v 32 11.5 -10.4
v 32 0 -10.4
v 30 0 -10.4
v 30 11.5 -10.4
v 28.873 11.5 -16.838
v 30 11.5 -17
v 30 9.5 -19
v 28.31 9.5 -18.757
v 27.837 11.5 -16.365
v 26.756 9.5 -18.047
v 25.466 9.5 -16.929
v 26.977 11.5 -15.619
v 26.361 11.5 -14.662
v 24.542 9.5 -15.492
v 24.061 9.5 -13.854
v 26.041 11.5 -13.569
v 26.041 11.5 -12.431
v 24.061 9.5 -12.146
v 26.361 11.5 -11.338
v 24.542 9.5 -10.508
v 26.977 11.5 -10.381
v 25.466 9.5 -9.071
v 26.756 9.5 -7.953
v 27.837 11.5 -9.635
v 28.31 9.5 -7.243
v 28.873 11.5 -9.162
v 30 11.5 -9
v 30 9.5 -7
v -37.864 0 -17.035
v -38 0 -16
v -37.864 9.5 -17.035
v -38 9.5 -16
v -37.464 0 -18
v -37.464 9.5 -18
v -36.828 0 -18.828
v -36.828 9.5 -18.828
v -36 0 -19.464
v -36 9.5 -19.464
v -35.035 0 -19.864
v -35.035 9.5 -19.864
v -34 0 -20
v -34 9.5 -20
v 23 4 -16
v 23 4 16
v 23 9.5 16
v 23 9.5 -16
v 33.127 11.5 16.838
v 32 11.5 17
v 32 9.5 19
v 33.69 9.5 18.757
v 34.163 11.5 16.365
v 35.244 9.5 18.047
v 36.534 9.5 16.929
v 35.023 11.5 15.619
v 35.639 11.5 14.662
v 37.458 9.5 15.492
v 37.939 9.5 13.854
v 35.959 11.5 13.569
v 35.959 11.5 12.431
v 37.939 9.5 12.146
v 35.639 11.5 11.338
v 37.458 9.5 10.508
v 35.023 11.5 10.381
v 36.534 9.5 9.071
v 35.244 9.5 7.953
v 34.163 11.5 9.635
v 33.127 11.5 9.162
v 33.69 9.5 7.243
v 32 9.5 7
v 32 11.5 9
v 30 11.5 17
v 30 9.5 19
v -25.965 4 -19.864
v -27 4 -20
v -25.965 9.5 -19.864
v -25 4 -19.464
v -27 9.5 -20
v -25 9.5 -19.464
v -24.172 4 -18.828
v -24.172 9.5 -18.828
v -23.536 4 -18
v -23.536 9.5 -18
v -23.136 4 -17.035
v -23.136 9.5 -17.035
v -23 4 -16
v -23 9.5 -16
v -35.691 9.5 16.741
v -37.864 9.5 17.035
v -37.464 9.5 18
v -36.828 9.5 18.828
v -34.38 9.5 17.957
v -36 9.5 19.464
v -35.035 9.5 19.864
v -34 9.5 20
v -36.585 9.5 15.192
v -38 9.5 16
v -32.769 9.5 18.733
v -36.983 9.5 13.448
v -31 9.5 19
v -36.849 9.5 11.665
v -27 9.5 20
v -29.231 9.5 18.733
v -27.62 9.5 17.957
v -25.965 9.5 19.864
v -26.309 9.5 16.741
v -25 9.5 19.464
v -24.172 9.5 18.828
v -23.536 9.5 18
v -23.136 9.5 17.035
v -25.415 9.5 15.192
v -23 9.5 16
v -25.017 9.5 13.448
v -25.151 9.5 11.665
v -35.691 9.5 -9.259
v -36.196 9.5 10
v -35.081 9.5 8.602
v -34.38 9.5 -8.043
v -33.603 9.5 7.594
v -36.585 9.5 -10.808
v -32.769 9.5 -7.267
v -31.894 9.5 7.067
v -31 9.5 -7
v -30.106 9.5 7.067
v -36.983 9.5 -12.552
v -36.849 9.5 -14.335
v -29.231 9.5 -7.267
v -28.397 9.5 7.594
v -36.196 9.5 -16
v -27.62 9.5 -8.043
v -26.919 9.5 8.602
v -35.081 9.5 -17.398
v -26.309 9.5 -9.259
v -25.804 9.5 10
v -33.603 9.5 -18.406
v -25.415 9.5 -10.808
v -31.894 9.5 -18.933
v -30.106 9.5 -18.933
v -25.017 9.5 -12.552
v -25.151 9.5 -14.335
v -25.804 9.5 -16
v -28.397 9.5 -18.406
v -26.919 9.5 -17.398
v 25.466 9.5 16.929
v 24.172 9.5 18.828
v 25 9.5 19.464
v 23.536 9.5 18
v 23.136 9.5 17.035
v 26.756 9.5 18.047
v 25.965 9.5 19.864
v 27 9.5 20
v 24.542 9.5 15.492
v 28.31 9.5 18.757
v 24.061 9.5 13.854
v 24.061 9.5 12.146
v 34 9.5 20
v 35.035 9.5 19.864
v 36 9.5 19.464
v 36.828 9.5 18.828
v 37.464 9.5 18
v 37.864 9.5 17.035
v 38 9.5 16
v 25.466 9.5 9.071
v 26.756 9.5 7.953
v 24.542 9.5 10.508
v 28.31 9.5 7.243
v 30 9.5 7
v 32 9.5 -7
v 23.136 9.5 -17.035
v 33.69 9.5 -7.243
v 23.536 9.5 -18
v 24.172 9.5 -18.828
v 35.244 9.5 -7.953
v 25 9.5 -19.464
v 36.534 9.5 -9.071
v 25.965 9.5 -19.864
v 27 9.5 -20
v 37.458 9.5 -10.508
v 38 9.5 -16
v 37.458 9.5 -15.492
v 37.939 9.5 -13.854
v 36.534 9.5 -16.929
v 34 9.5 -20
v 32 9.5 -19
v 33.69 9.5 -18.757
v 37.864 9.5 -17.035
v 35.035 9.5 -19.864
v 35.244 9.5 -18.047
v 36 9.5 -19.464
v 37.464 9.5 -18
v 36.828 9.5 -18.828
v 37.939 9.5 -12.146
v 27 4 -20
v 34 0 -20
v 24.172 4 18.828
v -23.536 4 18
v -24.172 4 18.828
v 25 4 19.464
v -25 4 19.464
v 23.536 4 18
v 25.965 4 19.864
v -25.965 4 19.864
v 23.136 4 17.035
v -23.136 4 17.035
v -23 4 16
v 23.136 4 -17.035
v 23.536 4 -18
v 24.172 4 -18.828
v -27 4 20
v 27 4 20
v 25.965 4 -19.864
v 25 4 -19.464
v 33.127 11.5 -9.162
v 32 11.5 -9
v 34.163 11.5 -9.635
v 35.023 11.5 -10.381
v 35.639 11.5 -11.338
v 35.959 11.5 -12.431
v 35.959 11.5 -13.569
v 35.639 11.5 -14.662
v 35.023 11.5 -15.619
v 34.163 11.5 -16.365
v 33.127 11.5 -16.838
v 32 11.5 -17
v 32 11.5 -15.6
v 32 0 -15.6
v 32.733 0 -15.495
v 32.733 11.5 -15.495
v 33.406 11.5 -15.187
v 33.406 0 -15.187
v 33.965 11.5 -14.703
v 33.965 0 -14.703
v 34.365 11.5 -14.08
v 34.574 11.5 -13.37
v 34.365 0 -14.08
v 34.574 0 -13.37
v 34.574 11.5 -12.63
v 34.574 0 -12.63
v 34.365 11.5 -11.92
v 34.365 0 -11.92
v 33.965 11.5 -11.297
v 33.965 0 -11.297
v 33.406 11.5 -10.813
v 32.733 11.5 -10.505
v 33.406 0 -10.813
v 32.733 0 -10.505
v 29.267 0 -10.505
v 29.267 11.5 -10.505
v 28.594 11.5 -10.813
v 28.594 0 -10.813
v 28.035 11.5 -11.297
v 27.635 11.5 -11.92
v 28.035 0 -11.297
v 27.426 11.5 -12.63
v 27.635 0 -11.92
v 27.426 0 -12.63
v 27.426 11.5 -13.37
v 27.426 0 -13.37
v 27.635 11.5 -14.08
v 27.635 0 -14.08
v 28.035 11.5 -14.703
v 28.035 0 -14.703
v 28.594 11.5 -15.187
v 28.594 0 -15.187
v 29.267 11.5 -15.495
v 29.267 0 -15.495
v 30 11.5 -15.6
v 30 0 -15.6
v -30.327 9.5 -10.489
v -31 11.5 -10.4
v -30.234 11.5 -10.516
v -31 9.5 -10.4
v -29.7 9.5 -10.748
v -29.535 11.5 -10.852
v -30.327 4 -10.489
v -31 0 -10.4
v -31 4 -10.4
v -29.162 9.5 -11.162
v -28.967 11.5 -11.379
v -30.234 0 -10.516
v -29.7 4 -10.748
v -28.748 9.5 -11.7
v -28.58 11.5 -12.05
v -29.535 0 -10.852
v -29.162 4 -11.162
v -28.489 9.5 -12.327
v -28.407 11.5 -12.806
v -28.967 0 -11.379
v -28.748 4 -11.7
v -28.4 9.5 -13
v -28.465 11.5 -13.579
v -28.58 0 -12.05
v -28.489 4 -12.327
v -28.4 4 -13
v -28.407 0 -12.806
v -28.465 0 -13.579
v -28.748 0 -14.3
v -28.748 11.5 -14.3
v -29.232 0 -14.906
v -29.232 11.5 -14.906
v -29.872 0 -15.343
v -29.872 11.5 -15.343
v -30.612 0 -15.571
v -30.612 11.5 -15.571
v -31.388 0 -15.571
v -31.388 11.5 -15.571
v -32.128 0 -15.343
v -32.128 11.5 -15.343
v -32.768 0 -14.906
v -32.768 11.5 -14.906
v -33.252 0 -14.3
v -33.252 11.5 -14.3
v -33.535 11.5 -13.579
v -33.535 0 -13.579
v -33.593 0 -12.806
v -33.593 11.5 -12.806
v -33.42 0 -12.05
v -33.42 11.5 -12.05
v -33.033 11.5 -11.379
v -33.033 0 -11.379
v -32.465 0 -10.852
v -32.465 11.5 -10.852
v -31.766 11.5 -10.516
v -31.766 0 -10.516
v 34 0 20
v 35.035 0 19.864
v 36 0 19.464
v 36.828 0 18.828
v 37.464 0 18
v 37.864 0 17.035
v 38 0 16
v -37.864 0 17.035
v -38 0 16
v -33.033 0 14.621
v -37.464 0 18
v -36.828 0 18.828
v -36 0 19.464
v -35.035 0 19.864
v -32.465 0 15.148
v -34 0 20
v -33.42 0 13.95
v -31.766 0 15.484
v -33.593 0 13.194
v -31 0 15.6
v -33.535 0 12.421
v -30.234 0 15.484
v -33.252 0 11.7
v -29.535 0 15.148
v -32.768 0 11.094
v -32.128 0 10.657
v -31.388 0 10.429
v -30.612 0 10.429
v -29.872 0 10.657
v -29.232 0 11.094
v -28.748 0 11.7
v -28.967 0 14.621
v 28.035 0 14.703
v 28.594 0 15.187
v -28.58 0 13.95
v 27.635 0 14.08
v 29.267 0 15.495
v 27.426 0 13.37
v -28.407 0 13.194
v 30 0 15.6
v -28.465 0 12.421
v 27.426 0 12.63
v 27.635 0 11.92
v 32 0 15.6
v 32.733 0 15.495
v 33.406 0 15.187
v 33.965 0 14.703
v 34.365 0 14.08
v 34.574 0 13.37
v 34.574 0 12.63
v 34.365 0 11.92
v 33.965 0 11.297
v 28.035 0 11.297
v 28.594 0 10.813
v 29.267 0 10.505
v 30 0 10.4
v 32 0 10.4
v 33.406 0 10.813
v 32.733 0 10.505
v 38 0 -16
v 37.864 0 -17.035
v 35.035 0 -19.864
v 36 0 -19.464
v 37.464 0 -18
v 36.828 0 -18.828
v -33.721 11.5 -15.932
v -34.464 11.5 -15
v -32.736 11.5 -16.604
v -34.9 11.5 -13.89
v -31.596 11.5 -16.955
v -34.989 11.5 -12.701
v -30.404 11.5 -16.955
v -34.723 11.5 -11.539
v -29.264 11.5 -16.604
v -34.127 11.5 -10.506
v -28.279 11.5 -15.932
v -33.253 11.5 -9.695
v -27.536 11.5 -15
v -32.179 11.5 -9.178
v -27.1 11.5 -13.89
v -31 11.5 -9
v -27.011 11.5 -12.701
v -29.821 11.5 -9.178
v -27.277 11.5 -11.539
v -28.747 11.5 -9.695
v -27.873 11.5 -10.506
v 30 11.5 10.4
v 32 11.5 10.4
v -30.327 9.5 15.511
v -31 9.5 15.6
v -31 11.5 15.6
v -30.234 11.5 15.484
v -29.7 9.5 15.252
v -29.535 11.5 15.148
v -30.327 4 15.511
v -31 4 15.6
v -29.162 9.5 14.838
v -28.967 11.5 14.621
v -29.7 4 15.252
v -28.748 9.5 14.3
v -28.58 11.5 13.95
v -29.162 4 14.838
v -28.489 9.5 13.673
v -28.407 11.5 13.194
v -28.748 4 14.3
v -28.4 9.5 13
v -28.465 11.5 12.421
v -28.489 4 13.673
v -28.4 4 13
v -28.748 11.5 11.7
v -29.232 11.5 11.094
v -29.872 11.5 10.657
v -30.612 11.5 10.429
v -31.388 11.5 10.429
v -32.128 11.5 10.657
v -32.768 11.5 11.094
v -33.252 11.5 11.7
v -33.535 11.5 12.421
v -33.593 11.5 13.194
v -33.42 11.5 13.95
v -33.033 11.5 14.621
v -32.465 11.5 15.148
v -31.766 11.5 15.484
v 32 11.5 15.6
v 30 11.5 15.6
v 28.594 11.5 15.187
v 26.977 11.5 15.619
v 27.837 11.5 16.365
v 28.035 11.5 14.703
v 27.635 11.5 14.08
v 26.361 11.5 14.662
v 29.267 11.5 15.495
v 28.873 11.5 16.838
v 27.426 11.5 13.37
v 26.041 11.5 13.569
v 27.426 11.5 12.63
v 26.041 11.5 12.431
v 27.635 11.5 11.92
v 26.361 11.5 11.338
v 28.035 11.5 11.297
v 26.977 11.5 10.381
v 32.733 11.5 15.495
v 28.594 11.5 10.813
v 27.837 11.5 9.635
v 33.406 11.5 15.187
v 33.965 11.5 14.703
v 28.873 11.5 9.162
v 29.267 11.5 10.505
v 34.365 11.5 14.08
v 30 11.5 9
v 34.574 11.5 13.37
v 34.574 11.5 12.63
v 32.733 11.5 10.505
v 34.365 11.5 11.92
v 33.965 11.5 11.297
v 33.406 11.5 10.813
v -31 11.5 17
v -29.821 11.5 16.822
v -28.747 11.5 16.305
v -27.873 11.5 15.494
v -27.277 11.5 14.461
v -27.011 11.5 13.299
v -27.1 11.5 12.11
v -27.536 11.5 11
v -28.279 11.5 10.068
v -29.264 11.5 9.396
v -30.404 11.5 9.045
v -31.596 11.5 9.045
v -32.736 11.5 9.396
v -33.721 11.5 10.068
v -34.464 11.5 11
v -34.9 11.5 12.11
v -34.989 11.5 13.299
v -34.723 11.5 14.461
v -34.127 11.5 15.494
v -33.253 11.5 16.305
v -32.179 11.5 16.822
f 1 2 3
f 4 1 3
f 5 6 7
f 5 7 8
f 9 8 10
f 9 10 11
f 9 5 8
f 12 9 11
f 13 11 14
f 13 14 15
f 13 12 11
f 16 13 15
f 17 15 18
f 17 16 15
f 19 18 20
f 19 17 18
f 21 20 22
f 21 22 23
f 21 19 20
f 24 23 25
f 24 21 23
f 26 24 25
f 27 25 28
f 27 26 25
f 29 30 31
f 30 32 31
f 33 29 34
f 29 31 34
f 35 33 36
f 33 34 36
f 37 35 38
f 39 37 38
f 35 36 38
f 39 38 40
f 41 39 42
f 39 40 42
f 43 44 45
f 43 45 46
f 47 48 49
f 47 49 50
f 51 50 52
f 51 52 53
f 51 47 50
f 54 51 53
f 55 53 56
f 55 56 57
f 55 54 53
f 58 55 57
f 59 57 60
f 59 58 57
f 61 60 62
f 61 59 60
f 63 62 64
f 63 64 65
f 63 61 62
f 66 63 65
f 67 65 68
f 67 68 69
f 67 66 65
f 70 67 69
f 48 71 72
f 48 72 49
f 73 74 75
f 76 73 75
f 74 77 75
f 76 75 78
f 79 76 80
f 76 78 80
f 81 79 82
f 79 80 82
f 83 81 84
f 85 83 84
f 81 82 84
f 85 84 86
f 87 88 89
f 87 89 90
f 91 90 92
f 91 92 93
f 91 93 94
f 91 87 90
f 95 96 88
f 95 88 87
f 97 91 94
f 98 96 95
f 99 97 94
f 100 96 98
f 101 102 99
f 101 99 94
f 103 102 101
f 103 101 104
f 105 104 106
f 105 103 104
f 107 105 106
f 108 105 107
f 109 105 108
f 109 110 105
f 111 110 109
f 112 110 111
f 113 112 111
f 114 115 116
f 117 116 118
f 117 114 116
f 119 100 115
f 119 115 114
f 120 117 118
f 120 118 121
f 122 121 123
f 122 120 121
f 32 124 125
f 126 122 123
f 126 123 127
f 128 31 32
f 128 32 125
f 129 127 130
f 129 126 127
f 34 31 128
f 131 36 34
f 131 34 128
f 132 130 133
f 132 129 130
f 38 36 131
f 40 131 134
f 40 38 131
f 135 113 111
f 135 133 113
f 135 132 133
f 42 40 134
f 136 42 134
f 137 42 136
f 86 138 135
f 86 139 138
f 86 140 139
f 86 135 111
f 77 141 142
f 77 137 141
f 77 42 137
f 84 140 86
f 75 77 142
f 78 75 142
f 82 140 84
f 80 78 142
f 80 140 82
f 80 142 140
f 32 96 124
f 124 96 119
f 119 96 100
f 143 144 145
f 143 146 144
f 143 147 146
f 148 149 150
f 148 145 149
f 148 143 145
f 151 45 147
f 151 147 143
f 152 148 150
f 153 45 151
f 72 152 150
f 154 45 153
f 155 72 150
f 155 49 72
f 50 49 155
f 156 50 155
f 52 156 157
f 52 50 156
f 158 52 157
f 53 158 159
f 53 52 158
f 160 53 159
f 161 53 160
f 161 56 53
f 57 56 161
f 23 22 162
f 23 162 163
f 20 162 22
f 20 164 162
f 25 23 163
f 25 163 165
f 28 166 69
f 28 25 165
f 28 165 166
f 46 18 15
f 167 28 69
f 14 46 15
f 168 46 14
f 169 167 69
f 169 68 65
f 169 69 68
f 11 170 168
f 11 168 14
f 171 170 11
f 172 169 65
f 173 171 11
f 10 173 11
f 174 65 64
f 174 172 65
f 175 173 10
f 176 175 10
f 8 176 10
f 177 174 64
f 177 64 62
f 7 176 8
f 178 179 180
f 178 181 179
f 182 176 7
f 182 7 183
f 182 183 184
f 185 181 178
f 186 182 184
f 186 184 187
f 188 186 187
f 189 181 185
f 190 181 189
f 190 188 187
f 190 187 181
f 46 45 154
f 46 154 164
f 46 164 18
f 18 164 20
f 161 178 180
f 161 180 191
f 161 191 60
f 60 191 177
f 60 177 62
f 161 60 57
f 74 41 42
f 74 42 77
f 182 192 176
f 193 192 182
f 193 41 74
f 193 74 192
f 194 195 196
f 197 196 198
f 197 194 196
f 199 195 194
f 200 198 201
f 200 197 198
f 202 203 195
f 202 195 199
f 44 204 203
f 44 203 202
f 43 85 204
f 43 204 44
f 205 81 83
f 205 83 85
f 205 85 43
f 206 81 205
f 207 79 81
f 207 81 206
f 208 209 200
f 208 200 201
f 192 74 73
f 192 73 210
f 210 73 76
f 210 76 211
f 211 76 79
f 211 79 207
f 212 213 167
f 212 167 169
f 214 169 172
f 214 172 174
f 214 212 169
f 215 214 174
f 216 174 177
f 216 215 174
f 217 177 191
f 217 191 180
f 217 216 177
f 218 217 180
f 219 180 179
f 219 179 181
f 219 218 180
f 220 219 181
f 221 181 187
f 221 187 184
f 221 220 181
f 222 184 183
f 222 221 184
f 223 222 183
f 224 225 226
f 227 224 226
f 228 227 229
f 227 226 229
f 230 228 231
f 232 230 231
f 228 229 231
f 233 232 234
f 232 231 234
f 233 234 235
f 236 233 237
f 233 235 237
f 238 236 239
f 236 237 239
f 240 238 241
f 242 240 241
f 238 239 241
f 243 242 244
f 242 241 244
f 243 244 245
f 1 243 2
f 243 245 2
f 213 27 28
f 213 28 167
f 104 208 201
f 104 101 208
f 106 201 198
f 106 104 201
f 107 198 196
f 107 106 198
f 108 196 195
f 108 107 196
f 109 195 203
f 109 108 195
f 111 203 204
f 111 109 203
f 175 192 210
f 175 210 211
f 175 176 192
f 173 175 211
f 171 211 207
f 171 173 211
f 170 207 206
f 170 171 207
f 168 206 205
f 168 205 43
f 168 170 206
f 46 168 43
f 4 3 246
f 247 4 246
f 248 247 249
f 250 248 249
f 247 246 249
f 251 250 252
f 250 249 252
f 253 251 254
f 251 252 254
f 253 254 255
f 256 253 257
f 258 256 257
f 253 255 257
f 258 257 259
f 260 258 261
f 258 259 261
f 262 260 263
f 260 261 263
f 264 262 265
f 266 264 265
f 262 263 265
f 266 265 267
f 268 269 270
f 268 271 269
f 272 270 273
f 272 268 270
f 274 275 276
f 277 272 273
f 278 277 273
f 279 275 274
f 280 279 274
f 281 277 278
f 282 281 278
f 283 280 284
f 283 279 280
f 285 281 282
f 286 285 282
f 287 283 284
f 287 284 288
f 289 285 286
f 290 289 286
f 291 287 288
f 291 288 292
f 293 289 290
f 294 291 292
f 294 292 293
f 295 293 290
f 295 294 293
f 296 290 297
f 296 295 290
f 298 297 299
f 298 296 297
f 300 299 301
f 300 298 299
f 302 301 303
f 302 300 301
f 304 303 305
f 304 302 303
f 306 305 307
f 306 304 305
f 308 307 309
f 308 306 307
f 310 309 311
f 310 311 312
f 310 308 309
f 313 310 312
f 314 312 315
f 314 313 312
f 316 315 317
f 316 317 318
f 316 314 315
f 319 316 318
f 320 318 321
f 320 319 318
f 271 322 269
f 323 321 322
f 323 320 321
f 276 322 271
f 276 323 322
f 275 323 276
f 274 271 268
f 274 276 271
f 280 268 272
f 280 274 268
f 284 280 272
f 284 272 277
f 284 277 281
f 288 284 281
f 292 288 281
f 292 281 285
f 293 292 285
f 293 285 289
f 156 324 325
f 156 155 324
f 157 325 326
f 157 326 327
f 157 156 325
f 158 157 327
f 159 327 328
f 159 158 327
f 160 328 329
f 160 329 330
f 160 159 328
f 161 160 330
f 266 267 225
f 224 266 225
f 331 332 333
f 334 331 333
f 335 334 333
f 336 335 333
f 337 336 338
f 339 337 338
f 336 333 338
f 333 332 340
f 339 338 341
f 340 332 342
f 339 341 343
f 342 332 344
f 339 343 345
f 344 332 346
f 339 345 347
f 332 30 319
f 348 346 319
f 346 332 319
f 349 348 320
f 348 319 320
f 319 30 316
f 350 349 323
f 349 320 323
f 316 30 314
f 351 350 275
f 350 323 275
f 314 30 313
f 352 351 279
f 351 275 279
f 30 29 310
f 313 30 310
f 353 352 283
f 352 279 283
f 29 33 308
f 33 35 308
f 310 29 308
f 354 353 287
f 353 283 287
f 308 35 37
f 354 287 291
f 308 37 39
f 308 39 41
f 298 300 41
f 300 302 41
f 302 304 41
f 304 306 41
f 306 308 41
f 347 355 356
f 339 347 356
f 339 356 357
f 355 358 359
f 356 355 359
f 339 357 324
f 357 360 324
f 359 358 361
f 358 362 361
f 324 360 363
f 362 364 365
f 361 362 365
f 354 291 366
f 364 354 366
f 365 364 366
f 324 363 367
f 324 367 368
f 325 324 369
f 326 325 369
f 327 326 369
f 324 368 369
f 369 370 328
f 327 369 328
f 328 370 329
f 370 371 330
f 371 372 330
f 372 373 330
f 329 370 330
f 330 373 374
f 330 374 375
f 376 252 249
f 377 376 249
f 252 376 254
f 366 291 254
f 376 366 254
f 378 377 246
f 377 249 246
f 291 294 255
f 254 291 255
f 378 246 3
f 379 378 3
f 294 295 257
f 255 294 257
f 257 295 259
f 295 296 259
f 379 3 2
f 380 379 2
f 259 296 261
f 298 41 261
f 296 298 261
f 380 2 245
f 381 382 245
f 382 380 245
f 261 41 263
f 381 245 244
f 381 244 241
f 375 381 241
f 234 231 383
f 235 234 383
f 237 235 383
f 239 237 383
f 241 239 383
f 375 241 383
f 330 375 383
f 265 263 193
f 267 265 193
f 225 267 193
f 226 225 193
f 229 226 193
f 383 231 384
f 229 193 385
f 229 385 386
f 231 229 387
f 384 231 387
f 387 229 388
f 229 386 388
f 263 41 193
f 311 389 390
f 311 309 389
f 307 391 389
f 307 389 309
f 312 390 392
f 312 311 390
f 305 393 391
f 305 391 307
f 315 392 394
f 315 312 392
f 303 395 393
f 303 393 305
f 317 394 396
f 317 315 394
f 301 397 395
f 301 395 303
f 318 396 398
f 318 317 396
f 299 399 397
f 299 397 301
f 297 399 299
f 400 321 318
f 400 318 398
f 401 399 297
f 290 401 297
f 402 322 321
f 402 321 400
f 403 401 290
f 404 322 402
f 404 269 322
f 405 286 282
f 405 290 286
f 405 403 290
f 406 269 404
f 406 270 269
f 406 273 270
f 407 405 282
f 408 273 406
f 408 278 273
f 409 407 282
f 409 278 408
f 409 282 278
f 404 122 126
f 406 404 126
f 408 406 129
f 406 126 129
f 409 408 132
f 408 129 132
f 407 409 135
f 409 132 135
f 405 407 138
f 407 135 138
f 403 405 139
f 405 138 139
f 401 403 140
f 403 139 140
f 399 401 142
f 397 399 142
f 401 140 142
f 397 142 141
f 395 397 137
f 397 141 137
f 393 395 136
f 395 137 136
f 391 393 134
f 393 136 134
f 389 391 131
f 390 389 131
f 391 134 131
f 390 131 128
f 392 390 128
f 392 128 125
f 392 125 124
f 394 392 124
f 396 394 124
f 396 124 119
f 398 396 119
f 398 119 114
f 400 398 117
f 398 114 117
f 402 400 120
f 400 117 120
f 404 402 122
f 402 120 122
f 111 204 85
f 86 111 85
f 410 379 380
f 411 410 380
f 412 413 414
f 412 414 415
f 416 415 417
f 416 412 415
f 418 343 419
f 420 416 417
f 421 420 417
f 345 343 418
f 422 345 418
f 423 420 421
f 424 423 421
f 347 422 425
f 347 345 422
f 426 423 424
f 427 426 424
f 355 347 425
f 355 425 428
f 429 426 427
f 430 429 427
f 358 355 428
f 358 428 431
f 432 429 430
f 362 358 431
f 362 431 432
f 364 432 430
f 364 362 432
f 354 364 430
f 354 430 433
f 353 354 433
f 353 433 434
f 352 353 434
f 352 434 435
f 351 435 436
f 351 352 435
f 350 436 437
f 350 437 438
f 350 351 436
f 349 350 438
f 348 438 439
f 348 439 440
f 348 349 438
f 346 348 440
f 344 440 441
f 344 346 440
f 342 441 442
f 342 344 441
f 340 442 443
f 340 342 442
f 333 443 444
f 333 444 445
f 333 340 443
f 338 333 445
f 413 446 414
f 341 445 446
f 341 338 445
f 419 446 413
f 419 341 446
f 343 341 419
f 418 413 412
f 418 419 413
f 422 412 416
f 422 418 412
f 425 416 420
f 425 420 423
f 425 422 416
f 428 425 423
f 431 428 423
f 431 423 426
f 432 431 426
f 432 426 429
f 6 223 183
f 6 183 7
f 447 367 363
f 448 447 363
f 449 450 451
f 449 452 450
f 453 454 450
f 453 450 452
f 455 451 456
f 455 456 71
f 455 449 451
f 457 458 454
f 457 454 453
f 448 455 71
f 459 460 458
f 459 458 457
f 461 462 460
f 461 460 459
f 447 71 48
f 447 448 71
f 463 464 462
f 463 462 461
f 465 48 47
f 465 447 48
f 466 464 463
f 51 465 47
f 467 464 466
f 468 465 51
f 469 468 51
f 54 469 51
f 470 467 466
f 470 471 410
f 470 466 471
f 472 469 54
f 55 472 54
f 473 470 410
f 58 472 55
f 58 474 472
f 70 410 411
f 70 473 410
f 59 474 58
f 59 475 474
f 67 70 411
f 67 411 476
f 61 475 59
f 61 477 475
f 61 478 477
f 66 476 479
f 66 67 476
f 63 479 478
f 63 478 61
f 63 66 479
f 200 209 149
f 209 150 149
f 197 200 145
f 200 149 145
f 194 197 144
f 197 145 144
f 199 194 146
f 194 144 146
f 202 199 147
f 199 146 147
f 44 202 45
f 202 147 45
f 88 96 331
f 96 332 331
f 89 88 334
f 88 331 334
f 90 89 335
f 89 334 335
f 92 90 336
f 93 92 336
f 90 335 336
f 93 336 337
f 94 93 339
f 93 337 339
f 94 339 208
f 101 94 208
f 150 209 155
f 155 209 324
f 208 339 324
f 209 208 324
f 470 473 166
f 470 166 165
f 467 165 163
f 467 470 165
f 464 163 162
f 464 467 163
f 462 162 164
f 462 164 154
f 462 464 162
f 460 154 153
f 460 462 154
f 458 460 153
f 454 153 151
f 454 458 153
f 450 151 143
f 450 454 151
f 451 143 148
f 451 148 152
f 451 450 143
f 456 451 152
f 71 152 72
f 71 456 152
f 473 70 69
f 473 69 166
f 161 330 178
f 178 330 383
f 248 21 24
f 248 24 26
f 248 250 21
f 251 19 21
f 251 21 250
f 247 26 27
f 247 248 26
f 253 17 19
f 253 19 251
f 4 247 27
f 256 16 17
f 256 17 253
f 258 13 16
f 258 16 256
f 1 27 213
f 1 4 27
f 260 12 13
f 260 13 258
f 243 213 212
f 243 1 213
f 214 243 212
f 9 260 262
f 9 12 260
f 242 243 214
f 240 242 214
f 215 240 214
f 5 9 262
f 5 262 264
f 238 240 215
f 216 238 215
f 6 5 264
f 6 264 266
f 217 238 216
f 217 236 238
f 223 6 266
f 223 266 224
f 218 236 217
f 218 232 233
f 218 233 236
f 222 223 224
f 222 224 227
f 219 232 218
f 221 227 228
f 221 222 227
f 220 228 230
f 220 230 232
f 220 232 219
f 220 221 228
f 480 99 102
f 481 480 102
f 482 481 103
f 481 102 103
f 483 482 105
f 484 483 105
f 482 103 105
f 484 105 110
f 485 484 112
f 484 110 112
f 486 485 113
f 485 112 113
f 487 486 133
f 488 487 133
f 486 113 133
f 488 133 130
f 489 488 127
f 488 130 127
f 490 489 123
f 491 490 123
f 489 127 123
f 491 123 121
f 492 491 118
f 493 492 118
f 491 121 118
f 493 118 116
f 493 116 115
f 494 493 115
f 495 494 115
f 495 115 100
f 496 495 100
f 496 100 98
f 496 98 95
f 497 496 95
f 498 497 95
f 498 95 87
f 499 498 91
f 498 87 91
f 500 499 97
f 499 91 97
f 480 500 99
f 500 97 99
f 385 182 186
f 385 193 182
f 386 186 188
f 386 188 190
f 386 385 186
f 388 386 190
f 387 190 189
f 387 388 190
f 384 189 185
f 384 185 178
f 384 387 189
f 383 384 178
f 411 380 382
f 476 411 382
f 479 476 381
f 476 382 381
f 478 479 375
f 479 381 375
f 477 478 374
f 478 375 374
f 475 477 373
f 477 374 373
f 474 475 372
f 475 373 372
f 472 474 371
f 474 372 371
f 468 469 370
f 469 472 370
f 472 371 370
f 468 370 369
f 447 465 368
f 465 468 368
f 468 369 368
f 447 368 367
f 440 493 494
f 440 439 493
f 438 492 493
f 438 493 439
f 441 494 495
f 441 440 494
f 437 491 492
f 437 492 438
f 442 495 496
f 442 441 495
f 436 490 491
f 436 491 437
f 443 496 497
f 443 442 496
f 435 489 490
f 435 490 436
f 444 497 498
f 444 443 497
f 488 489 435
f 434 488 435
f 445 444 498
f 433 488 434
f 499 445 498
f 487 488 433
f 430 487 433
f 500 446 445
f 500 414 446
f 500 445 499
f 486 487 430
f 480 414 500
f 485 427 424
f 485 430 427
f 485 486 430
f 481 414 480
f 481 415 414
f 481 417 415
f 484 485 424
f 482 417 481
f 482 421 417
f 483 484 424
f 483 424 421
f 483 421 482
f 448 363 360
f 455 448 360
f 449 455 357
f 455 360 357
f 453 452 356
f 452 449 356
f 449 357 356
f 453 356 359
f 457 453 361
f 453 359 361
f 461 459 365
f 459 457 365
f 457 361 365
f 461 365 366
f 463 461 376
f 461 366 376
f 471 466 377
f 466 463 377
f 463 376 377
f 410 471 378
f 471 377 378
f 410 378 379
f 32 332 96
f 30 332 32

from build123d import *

# Parameters (mm, degrees)
SKETCH1_W           = 76
SKETCH1_H           = 40
SKETCH1_R           = 2.6
BOSS_EXTRUDE1_DEPTH = 4
SKETCH2_W           = 15
SKETCH2_H           = 40
SKETCH2_R           = 2.6
BOSS_EXTRUDE2_DEPTH = 5.5
SKETCH3_R           = 4
SKETCH3_R_2         = 2.6
BOSS_EXTRUDE3_DEPTH = 2
CHAMFER1_SIZE       = 2
FILLET1_R           = 4


with BuildPart() as part:
    # Sketch1 → Boss-Extrude1 (new body)
    with BuildSketch(Plane(origin=(0, 0, 0), x_dir=(1, 0, 0), z_dir=(0, 1, 0))):
        Rectangle(SKETCH1_W, SKETCH1_H)
        with Locations(Location((-31, -13, 0), (0, 0, 270))):
            Circle(SKETCH1_R, mode=Mode.SUBTRACT)
        with Locations(Location((-31, 13, 0), (0, 0, 270))):
            Circle(SKETCH1_R, mode=Mode.SUBTRACT)
        with BuildLine():
            Line((30, 15.6), (32, 15.6))
            ThreePointArc((32, 15.6), (34.6, 13), (32, 10.4))
            Line((32, 10.4), (30, 10.4))
            ThreePointArc((30, 10.4), (27.4, 13), (30, 15.6))
        make_face(mode=Mode.SUBTRACT)
        with BuildLine():
            Line((32, -10.4), (30, -10.4))
            ThreePointArc((30, -10.4), (27.4, -13), (30, -15.6))
            Line((30, -15.6), (32, -15.6))
            ThreePointArc((32, -15.6), (34.6, -13), (32, -10.4))
        make_face(mode=Mode.SUBTRACT)
    extrude(amount=BOSS_EXTRUDE1_DEPTH)

    # Sketch2 → Boss-Extrude2 (add)
    # profile 1 of 2: a face of its own
    with BuildSketch(Plane(origin=(0, 4, 0), x_dir=(1, 0, 0), z_dir=(0, 1, 0))):
        with Locations((30.5, 0)):
            Rectangle(SKETCH2_W, SKETCH2_H)
        with BuildLine():
            ThreePointArc((30, -15.6), (27.4, -13), (30, -10.4))
            Line((30, -10.4), (32, -10.4))
            ThreePointArc((32, -10.4), (34.6, -13), (32, -15.6))
            Line((32, -15.6), (30, -15.6))
        make_face(mode=Mode.SUBTRACT)
        with BuildLine():
            ThreePointArc((30, 10.4), (27.4, 13), (30, 15.6))
            Line((30, 15.6), (32, 15.6))
            ThreePointArc((32, 15.6), (34.6, 13), (32, 10.4))
            Line((32, 10.4), (30, 10.4))
        make_face(mode=Mode.SUBTRACT)
    # profile 2 of 2: a face of its own
    with BuildSketch(Plane(origin=(0, 4, 0), x_dir=(1, 0, 0), z_dir=(0, 1, 0))):
        with Locations((-30.5, 0)):
            Rectangle(SKETCH2_W, SKETCH2_H)
        with Locations((-31, -13)):
            Circle(SKETCH2_R, mode=Mode.SUBTRACT)
        with Locations((-31, 13)):
            Circle(SKETCH2_R, mode=Mode.SUBTRACT)
    extrude(amount=BOSS_EXTRUDE2_DEPTH)

    # Sketch3 → Boss-Extrude3 (add)
    # profile 1 of 4: a face of its own
    with BuildSketch(Plane(origin=(0, 9.5, 0), x_dir=(1, 0, 0), z_dir=(0, 1, 0))):
        with Locations(Location((-31, 13, 0), (0, 0, 270))):
            Circle(SKETCH3_R)
        with Locations(Location((-31, 13, 0), (0, 0, 270))):
            Circle(SKETCH3_R_2, mode=Mode.SUBTRACT)
    # profile 2 of 4: a face of its own
    with BuildSketch(Plane(origin=(0, 9.5, 0), x_dir=(1, 0, 0), z_dir=(0, 1, 0))):
        with Locations(Location((-31, -13, 0), (0, 0, 270))):
            Circle(SKETCH3_R)
        with Locations(Location((-31, -13, 0), (0, 0, 270))):
            Circle(SKETCH3_R_2, mode=Mode.SUBTRACT)
    # profile 3 of 4: a face of its own
    with BuildSketch(Plane(origin=(0, 9.5, 0), x_dir=(1, 0, 0), z_dir=(0, 1, 0))):
        with BuildLine():
            Line((32, 17), (30, 17))
            ThreePointArc((30, 17), (26, 13), (30, 9))
            Line((30, 9), (32, 9))
            ThreePointArc((32, 9), (36, 13), (32, 17))
        make_face()
        with BuildLine():
            Line((30, 15.6), (32, 15.6))
            ThreePointArc((32, 15.6), (34.6, 13), (32, 10.4))
            Line((32, 10.4), (30, 10.4))
            ThreePointArc((30, 10.4), (27.4, 13), (30, 15.6))
        make_face(mode=Mode.SUBTRACT)
    # profile 4 of 4: a face of its own
    with BuildSketch(Plane(origin=(0, 9.5, 0), x_dir=(1, 0, 0), z_dir=(0, 1, 0))):
        with BuildLine():
            Line((32, -9), (30, -9))
            ThreePointArc((30, -9), (26, -13), (30, -17))
            Line((30, -17), (32, -17))
            ThreePointArc((32, -17), (36, -13), (32, -9))
        make_face()
        with BuildLine():
            Line((32, -10.4), (30, -10.4))
            ThreePointArc((30, -10.4), (27.4, -13), (30, -15.6))
            Line((30, -15.6), (32, -15.6))
            ThreePointArc((32, -15.6), (34.6, -13), (32, -10.4))
        make_face(mode=Mode.SUBTRACT)
    extrude(amount=BOSS_EXTRUDE3_DEPTH)

    # Chamfer1
    chamfer1_edges = [part.edges().sort_by_distance(p)[0] for p in [
        (-31, 9.5, 9),
        (-31, 9.5, -17),
        (31, 9.5, -17),
        (26, 9.5, -13),
        (31, 9.5, -9),
        (36, 9.5, -13),
        (31, 9.5, 9),
        (26, 9.5, 13),
        (36, 9.5, 13),
        (31, 9.5, 17),
    ]]
    chamfer(chamfer1_edges, length=CHAMFER1_SIZE - 0.0001)  # a hair under: the kernel refuses the full size

    # Fillet1
    fillet1_edges = [part.edges().sort_by_distance(p)[0] for p in [
        (38, 4.75, 20),
        (-38, 4.75, 20),
        (-38, 4.75, -20),
        (38, 4.75, -20),
        (-23, 6.75, 20),
        (-23, 6.75, -20),
        (23, 6.75, -20),
        (23, 6.75, 20),
    ]]
    fillet(fillet1_edges, radius=FILLET1_R)


solid = part.part
